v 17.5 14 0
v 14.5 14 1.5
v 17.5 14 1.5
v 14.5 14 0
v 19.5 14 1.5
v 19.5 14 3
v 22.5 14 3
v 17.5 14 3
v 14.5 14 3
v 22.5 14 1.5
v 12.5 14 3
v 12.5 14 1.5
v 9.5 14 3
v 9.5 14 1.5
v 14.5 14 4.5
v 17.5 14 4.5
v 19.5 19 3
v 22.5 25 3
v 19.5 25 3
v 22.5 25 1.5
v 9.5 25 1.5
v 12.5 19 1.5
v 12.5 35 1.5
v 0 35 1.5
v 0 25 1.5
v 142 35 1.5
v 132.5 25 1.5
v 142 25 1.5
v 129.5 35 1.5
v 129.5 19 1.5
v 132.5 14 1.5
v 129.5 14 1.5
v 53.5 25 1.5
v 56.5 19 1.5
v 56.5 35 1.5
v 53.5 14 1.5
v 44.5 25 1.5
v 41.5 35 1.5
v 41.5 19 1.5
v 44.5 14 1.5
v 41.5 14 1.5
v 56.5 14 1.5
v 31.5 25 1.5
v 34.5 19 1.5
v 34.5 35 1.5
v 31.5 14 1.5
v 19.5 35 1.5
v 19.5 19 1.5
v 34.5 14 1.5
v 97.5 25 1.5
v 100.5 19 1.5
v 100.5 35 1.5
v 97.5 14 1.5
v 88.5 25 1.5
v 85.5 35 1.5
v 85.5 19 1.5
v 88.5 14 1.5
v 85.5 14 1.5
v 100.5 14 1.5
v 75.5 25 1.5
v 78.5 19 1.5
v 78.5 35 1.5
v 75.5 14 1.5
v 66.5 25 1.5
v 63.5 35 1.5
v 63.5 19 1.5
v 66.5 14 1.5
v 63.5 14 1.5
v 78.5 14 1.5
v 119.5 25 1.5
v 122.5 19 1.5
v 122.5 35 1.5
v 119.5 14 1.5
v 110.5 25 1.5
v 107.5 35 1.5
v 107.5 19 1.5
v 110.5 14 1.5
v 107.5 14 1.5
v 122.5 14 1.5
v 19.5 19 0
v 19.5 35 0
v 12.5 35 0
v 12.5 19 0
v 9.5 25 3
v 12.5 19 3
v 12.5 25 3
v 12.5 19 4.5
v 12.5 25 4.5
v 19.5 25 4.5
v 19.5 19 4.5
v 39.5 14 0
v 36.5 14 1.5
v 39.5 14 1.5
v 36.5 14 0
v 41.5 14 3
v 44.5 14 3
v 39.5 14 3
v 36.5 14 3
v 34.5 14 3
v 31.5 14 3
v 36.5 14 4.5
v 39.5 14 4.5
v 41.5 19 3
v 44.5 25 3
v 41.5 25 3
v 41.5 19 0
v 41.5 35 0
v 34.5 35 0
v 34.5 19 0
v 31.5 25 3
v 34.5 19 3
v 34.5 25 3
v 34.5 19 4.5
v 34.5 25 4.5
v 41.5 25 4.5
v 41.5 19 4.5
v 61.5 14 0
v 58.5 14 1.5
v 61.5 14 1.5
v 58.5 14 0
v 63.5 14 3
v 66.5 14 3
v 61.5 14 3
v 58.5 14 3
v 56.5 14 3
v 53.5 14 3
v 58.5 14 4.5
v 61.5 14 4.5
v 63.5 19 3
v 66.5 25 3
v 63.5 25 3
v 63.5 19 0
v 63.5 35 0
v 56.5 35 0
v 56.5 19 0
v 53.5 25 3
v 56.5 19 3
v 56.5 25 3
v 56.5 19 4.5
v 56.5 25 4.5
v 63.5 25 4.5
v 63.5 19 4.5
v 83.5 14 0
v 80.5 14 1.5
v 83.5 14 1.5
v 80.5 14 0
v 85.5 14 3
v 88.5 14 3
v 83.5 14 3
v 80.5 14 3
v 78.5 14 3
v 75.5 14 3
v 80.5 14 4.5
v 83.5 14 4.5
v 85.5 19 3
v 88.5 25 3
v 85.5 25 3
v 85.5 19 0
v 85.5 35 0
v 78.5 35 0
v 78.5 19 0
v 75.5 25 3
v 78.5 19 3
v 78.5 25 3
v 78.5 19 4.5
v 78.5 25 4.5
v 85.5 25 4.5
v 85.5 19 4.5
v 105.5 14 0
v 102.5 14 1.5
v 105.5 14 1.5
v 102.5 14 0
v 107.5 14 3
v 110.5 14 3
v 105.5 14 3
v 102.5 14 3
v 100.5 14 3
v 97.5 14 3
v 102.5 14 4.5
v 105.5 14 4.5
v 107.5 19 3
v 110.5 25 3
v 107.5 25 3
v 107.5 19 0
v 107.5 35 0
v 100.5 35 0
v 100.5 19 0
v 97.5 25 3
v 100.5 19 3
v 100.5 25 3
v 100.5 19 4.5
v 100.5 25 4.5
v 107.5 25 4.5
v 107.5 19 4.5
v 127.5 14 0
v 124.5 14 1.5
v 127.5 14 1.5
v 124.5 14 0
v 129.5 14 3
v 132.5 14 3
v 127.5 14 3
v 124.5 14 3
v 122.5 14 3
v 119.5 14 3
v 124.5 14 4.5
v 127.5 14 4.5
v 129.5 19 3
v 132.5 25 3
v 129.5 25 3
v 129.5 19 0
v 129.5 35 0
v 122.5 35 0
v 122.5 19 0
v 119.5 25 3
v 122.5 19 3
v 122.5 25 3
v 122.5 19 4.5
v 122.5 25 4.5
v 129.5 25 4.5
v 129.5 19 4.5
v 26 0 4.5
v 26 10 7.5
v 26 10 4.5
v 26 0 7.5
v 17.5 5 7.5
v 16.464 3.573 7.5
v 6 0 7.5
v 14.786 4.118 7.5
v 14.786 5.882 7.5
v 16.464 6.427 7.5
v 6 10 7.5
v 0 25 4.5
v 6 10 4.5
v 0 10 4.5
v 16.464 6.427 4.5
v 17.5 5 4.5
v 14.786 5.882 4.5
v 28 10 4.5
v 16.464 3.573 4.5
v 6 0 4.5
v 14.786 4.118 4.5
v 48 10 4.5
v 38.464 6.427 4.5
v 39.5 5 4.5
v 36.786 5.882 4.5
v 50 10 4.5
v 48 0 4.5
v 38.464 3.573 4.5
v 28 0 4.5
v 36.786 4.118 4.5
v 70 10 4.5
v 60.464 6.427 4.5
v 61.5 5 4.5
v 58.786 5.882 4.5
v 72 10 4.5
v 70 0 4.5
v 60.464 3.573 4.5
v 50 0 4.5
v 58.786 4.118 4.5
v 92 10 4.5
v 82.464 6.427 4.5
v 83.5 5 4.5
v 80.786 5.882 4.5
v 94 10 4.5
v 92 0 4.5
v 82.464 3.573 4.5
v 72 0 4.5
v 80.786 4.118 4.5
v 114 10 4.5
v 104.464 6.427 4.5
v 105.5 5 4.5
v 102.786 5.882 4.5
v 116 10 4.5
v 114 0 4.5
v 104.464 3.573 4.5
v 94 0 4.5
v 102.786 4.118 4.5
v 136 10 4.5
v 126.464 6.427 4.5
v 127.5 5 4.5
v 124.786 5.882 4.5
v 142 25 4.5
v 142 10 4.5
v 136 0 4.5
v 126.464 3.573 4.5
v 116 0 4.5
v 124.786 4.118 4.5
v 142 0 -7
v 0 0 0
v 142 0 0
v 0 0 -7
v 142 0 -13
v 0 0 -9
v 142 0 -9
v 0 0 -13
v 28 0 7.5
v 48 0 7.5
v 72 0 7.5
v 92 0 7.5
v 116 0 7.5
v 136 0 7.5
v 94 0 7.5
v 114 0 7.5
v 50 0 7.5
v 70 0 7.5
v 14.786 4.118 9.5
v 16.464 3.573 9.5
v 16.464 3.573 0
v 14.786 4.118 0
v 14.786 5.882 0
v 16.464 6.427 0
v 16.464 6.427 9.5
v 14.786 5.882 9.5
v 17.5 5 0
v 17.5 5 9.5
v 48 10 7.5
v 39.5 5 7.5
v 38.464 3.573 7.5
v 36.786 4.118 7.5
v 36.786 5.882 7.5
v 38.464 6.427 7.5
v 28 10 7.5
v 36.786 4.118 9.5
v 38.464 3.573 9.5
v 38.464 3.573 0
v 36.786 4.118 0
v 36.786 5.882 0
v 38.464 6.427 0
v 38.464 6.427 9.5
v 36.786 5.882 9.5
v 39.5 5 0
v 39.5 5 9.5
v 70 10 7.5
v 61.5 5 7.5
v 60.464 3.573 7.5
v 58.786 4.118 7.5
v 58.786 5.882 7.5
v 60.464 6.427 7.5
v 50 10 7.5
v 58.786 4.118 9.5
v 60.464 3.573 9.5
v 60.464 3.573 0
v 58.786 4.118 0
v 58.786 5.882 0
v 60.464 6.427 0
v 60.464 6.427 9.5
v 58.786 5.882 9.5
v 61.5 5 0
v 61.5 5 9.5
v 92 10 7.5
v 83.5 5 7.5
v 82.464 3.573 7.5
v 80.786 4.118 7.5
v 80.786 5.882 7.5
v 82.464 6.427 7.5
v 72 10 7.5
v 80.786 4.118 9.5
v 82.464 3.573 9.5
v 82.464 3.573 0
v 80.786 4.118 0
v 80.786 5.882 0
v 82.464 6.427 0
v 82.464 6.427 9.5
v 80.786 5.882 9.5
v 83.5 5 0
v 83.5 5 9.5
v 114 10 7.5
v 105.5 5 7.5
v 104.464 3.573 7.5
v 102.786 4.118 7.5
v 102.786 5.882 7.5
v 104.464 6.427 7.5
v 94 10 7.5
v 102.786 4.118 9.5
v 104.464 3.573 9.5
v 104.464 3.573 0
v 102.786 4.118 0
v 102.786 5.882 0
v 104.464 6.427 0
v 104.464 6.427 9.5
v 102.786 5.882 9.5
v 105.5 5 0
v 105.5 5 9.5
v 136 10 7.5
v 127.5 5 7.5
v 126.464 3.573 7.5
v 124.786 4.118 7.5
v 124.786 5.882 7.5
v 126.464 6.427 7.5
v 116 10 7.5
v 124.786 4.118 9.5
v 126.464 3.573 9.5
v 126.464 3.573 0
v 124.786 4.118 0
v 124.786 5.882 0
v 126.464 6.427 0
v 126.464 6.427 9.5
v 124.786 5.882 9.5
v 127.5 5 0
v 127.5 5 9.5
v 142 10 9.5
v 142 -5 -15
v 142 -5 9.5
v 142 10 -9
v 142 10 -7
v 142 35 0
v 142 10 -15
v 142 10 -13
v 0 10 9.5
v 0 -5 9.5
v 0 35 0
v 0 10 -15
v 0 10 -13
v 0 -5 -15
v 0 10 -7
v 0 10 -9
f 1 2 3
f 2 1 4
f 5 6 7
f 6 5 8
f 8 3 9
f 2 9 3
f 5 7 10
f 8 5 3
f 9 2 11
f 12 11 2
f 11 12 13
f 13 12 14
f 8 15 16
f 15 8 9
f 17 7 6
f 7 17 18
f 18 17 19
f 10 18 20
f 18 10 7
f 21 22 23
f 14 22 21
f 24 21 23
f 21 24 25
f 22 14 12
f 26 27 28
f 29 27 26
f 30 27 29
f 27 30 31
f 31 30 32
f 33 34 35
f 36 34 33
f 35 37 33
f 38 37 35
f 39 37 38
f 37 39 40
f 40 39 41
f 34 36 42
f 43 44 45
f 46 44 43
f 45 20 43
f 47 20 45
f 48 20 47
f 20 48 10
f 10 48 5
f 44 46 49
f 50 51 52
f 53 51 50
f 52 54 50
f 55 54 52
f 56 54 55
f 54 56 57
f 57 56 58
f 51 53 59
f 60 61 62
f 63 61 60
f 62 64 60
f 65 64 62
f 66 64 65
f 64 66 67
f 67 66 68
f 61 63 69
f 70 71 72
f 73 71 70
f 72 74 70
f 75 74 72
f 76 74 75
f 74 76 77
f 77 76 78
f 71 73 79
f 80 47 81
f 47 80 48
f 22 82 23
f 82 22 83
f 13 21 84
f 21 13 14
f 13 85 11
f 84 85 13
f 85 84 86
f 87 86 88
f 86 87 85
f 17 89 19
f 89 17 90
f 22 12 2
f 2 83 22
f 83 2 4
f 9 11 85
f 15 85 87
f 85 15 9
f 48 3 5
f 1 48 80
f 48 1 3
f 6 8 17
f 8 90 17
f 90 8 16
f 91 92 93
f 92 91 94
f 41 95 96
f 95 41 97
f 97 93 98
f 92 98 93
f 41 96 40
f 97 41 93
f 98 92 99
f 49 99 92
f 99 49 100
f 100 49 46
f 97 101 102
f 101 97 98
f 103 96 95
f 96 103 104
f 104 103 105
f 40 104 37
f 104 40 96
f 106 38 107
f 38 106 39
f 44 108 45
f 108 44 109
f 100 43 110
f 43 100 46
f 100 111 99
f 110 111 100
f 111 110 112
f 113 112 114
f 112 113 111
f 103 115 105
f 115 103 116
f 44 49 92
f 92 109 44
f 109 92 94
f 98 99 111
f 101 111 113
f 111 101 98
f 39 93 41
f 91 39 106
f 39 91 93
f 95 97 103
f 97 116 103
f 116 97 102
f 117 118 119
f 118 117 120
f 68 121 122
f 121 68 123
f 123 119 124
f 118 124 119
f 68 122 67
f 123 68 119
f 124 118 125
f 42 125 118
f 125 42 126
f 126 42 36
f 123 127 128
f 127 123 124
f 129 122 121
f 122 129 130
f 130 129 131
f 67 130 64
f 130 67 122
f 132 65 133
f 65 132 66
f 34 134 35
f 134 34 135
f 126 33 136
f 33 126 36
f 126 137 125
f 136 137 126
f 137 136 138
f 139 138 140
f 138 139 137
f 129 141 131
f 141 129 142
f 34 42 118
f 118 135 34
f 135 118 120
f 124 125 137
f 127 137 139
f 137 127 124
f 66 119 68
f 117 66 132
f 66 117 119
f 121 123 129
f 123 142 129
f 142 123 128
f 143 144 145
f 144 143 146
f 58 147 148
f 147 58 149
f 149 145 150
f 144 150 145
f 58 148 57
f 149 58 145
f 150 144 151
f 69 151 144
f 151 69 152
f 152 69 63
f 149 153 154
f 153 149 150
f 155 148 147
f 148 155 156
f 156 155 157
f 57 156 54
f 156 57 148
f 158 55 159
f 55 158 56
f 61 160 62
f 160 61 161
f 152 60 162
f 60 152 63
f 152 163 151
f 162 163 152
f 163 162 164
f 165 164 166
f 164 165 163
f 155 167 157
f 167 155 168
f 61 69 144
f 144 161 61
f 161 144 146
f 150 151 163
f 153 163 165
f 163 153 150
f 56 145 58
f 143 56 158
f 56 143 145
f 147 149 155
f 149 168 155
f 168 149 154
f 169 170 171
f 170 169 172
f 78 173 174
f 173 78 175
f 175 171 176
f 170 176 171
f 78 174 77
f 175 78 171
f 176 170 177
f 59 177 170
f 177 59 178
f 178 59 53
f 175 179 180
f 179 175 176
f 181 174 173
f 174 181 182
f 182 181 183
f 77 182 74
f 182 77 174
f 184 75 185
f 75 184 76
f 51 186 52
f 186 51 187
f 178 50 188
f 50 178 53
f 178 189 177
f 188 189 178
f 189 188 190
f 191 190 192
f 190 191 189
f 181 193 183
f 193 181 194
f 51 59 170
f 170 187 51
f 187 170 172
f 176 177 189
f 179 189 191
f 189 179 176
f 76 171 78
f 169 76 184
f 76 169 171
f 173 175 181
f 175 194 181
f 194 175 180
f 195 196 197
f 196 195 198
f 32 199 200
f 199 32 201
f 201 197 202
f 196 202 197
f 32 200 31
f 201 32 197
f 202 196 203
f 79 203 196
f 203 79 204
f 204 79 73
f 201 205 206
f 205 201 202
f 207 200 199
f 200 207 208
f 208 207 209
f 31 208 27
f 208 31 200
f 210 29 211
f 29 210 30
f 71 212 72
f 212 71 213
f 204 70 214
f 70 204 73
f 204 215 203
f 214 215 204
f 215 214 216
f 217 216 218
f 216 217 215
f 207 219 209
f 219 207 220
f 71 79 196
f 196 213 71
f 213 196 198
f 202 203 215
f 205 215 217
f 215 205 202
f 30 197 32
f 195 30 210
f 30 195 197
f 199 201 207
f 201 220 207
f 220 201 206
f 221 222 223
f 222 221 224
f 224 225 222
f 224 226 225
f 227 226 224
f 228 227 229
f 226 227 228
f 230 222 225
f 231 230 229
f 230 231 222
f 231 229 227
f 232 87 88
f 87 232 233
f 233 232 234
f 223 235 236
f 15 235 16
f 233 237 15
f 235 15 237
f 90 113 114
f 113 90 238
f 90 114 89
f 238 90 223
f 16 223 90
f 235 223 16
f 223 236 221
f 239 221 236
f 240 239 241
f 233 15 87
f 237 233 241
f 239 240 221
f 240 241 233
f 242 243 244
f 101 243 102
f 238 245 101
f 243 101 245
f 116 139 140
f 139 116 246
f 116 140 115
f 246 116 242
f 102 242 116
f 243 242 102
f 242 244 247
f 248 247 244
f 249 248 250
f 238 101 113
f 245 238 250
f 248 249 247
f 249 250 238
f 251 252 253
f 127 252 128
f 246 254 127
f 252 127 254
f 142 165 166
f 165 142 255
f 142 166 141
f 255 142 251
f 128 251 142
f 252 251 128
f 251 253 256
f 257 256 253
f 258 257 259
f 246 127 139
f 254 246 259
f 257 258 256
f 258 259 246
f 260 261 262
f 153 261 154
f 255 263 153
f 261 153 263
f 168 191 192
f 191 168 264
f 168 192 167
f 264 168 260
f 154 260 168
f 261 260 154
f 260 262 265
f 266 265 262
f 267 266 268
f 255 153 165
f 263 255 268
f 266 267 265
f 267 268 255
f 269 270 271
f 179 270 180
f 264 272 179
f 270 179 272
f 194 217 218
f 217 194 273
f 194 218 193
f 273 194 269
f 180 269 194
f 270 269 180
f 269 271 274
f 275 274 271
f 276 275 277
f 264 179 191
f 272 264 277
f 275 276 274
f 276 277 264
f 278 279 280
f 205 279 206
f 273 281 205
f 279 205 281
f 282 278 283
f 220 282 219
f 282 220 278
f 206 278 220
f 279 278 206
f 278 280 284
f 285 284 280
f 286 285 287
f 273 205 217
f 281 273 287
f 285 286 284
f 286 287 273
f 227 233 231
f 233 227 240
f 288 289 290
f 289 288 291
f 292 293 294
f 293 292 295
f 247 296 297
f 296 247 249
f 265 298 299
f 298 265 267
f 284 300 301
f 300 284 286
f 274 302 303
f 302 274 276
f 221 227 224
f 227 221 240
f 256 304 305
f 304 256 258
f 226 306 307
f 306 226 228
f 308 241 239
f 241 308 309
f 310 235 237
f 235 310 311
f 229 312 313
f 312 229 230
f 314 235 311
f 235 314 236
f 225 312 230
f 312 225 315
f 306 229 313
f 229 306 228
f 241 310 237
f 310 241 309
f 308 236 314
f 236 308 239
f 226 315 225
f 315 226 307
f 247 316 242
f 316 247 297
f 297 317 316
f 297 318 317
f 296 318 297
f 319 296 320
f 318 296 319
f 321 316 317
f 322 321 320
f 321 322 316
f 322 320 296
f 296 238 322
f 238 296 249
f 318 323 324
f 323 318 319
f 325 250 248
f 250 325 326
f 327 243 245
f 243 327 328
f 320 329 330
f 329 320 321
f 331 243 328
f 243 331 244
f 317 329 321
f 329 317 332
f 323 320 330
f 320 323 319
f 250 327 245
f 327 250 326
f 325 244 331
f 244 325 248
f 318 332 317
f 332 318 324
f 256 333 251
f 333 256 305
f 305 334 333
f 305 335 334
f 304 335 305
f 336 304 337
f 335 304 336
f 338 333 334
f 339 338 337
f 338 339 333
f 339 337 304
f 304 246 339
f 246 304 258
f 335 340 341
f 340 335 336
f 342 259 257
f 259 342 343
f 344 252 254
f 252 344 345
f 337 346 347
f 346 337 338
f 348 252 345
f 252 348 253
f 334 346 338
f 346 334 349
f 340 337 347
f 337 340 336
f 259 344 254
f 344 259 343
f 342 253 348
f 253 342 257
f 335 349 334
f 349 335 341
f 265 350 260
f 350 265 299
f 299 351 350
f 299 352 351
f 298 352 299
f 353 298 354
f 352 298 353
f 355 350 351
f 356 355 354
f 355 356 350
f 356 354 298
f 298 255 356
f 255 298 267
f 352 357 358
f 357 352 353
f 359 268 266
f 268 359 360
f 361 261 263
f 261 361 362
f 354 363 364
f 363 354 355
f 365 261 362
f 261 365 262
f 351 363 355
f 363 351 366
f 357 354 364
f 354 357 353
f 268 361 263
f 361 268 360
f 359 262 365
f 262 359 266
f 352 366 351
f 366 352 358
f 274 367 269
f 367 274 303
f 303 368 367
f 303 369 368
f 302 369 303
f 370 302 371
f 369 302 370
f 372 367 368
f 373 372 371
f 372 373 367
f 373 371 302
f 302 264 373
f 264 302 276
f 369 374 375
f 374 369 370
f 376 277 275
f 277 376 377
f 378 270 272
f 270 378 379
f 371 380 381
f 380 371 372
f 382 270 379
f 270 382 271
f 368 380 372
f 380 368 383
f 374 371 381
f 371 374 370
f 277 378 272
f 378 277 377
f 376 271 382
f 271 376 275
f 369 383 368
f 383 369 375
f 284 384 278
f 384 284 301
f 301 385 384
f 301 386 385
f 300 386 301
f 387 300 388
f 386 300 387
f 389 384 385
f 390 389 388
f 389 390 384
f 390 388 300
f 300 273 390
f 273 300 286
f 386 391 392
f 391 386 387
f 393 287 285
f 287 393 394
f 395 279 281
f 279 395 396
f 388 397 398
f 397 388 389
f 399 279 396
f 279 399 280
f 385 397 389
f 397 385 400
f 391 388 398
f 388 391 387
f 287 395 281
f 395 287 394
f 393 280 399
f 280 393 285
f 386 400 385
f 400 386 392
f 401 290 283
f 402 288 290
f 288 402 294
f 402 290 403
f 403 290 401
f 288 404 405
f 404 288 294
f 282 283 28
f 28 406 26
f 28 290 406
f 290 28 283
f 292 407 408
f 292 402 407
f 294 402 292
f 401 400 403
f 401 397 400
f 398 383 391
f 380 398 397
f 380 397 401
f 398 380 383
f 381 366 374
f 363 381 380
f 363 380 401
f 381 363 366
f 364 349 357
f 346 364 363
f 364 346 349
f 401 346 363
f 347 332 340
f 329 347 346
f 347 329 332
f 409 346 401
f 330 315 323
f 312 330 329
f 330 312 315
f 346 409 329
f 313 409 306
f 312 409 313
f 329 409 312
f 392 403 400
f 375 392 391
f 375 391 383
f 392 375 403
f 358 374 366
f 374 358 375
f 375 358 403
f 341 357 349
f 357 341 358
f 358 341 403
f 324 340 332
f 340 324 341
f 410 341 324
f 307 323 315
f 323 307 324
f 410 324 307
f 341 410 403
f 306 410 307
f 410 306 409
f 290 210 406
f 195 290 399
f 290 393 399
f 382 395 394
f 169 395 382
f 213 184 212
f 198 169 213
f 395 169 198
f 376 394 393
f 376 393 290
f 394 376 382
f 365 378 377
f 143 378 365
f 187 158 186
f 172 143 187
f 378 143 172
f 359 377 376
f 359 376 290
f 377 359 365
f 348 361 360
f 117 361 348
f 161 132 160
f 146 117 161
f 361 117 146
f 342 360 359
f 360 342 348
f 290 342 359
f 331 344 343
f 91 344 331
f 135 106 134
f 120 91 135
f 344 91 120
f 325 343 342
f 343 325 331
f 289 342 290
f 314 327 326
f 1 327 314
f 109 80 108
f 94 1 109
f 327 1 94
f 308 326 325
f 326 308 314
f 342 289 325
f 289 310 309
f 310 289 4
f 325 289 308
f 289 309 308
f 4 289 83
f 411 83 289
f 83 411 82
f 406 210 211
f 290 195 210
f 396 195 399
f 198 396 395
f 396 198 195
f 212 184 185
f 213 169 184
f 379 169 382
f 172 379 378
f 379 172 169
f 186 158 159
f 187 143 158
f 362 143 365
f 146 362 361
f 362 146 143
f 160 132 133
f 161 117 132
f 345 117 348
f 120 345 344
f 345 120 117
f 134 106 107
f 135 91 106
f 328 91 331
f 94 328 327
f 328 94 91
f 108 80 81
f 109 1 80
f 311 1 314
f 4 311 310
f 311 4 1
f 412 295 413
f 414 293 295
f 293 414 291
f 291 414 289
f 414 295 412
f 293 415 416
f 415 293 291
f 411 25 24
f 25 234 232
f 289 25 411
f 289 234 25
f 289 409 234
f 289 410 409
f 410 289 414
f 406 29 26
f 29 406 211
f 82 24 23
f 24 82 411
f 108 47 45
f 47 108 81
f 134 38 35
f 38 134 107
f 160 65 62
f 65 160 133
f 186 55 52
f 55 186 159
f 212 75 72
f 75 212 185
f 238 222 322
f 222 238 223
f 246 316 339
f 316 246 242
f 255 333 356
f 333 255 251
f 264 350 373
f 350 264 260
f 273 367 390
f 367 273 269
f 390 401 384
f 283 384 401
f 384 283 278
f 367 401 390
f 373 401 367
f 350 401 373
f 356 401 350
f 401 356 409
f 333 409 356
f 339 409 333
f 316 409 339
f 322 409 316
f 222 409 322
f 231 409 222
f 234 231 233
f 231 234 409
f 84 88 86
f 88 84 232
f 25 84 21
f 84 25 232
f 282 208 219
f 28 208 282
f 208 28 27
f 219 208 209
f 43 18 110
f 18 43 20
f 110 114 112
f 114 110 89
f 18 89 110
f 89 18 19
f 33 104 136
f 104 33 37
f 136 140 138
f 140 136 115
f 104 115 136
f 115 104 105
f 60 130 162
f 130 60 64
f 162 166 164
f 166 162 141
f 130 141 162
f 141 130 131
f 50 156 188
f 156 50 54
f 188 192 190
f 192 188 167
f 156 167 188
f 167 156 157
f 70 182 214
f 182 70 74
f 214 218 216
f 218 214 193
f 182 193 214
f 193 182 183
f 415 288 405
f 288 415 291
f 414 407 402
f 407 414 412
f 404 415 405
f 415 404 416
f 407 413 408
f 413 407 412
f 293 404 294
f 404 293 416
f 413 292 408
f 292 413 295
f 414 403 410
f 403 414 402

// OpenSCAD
module Magnet() {
    translate([-10, 0, 0])
    cube([20, 10, 3]);
}

module Nozzle() {
    translate([0, 0, 1])
    cylinder(3, d=6);

    cylinder(1, d=10);

    translate([0, 0, -5])
    cylinder(5, d=6);

    translate([0, 0, -6 + -5])
    cylinder(6, d=5);
}

module CutoutNozzle() {
    difference() {
        translate([0, 0, 4.5])
        rotate(-90, [1, 0, 0])
        linear_extrude(30)
        polygon([[-3.5, 5.5], [-3.5, 3], [-6.5, 3],
                 [-6.5, 1.5], [-3.5, 1.5], [-3.5, -1],
                 [3.5, -1], [3.5, 1.5], [6.5, 1.5],
                 [6.5, 3], [3.5, 3], [3.5, 5.5]]);

        translate([-3.5, 0, -1])
        linear_extrude(2.5)
        polygon([[0, 0], [0, 5], [2, 0]]);

        translate([-3.5, 0, 3])
        linear_extrude(2.5)
        polygon([[0, 0], [0, 5], [2, 0]]);

        translate([3.5, 0, -1])
        linear_extrude(2.5)
        polygon([[0, 0], [0, 5], [-2, 0]]);

        translate([3.5, 0, 3])
        linear_extrude(2.5)
        polygon([[0, 0], [0, 5], [-2, 0]]);
    }
}

module CutoutMagnet() {
    translate([-10, 0, 0])
    cube([20, 11, 3]);
    translate([0, 5, -6])
    cylinder(d=3, 15);
}

module NozzleHolder() {
    length = 142;
    difference() {
        cube([142, 35, 9.5]);

        translate([-1, 10, 4.5])
        cube([144, 16, 6]);

        translate([-1, 25, 1.5])
        cube([144, 11, 9]);

        for(i=[0:5]) {
            translate([i * 22 + 16, 14, 0])
            CutoutNozzle();
        }

        for(i=[0:5]) {
            translate([i * 22 + 16, 0, 4.5])
            CutoutMagnet();
        }
    }
}

module MountingBracket() {
    translate([0, -5, -15])
    cube([142, 5, 24.5]);
    translate([0, 0, -15])
    difference() {
        cube([142, 10, 8]);
        translate([-1, 0, 2])
        cube([144, 11, 4]);
    }
}

module PnPHolder() {
    NozzleHolder();
    MountingBracket();
}

module PnPHolderWithParts() {
    PnPHolder();

    for(i=[0:5]) {
        translate([i * 22 + 16, 14 + 5, 1.5])
        Nozzle();
    }

    for(i=[0:5]) {
        translate([i * 22 + 16, 0, 4.5])
        Magnet();
    }
}

//PnPHolderWithParts();
PnPHolder();
//CutoutNozzle();
